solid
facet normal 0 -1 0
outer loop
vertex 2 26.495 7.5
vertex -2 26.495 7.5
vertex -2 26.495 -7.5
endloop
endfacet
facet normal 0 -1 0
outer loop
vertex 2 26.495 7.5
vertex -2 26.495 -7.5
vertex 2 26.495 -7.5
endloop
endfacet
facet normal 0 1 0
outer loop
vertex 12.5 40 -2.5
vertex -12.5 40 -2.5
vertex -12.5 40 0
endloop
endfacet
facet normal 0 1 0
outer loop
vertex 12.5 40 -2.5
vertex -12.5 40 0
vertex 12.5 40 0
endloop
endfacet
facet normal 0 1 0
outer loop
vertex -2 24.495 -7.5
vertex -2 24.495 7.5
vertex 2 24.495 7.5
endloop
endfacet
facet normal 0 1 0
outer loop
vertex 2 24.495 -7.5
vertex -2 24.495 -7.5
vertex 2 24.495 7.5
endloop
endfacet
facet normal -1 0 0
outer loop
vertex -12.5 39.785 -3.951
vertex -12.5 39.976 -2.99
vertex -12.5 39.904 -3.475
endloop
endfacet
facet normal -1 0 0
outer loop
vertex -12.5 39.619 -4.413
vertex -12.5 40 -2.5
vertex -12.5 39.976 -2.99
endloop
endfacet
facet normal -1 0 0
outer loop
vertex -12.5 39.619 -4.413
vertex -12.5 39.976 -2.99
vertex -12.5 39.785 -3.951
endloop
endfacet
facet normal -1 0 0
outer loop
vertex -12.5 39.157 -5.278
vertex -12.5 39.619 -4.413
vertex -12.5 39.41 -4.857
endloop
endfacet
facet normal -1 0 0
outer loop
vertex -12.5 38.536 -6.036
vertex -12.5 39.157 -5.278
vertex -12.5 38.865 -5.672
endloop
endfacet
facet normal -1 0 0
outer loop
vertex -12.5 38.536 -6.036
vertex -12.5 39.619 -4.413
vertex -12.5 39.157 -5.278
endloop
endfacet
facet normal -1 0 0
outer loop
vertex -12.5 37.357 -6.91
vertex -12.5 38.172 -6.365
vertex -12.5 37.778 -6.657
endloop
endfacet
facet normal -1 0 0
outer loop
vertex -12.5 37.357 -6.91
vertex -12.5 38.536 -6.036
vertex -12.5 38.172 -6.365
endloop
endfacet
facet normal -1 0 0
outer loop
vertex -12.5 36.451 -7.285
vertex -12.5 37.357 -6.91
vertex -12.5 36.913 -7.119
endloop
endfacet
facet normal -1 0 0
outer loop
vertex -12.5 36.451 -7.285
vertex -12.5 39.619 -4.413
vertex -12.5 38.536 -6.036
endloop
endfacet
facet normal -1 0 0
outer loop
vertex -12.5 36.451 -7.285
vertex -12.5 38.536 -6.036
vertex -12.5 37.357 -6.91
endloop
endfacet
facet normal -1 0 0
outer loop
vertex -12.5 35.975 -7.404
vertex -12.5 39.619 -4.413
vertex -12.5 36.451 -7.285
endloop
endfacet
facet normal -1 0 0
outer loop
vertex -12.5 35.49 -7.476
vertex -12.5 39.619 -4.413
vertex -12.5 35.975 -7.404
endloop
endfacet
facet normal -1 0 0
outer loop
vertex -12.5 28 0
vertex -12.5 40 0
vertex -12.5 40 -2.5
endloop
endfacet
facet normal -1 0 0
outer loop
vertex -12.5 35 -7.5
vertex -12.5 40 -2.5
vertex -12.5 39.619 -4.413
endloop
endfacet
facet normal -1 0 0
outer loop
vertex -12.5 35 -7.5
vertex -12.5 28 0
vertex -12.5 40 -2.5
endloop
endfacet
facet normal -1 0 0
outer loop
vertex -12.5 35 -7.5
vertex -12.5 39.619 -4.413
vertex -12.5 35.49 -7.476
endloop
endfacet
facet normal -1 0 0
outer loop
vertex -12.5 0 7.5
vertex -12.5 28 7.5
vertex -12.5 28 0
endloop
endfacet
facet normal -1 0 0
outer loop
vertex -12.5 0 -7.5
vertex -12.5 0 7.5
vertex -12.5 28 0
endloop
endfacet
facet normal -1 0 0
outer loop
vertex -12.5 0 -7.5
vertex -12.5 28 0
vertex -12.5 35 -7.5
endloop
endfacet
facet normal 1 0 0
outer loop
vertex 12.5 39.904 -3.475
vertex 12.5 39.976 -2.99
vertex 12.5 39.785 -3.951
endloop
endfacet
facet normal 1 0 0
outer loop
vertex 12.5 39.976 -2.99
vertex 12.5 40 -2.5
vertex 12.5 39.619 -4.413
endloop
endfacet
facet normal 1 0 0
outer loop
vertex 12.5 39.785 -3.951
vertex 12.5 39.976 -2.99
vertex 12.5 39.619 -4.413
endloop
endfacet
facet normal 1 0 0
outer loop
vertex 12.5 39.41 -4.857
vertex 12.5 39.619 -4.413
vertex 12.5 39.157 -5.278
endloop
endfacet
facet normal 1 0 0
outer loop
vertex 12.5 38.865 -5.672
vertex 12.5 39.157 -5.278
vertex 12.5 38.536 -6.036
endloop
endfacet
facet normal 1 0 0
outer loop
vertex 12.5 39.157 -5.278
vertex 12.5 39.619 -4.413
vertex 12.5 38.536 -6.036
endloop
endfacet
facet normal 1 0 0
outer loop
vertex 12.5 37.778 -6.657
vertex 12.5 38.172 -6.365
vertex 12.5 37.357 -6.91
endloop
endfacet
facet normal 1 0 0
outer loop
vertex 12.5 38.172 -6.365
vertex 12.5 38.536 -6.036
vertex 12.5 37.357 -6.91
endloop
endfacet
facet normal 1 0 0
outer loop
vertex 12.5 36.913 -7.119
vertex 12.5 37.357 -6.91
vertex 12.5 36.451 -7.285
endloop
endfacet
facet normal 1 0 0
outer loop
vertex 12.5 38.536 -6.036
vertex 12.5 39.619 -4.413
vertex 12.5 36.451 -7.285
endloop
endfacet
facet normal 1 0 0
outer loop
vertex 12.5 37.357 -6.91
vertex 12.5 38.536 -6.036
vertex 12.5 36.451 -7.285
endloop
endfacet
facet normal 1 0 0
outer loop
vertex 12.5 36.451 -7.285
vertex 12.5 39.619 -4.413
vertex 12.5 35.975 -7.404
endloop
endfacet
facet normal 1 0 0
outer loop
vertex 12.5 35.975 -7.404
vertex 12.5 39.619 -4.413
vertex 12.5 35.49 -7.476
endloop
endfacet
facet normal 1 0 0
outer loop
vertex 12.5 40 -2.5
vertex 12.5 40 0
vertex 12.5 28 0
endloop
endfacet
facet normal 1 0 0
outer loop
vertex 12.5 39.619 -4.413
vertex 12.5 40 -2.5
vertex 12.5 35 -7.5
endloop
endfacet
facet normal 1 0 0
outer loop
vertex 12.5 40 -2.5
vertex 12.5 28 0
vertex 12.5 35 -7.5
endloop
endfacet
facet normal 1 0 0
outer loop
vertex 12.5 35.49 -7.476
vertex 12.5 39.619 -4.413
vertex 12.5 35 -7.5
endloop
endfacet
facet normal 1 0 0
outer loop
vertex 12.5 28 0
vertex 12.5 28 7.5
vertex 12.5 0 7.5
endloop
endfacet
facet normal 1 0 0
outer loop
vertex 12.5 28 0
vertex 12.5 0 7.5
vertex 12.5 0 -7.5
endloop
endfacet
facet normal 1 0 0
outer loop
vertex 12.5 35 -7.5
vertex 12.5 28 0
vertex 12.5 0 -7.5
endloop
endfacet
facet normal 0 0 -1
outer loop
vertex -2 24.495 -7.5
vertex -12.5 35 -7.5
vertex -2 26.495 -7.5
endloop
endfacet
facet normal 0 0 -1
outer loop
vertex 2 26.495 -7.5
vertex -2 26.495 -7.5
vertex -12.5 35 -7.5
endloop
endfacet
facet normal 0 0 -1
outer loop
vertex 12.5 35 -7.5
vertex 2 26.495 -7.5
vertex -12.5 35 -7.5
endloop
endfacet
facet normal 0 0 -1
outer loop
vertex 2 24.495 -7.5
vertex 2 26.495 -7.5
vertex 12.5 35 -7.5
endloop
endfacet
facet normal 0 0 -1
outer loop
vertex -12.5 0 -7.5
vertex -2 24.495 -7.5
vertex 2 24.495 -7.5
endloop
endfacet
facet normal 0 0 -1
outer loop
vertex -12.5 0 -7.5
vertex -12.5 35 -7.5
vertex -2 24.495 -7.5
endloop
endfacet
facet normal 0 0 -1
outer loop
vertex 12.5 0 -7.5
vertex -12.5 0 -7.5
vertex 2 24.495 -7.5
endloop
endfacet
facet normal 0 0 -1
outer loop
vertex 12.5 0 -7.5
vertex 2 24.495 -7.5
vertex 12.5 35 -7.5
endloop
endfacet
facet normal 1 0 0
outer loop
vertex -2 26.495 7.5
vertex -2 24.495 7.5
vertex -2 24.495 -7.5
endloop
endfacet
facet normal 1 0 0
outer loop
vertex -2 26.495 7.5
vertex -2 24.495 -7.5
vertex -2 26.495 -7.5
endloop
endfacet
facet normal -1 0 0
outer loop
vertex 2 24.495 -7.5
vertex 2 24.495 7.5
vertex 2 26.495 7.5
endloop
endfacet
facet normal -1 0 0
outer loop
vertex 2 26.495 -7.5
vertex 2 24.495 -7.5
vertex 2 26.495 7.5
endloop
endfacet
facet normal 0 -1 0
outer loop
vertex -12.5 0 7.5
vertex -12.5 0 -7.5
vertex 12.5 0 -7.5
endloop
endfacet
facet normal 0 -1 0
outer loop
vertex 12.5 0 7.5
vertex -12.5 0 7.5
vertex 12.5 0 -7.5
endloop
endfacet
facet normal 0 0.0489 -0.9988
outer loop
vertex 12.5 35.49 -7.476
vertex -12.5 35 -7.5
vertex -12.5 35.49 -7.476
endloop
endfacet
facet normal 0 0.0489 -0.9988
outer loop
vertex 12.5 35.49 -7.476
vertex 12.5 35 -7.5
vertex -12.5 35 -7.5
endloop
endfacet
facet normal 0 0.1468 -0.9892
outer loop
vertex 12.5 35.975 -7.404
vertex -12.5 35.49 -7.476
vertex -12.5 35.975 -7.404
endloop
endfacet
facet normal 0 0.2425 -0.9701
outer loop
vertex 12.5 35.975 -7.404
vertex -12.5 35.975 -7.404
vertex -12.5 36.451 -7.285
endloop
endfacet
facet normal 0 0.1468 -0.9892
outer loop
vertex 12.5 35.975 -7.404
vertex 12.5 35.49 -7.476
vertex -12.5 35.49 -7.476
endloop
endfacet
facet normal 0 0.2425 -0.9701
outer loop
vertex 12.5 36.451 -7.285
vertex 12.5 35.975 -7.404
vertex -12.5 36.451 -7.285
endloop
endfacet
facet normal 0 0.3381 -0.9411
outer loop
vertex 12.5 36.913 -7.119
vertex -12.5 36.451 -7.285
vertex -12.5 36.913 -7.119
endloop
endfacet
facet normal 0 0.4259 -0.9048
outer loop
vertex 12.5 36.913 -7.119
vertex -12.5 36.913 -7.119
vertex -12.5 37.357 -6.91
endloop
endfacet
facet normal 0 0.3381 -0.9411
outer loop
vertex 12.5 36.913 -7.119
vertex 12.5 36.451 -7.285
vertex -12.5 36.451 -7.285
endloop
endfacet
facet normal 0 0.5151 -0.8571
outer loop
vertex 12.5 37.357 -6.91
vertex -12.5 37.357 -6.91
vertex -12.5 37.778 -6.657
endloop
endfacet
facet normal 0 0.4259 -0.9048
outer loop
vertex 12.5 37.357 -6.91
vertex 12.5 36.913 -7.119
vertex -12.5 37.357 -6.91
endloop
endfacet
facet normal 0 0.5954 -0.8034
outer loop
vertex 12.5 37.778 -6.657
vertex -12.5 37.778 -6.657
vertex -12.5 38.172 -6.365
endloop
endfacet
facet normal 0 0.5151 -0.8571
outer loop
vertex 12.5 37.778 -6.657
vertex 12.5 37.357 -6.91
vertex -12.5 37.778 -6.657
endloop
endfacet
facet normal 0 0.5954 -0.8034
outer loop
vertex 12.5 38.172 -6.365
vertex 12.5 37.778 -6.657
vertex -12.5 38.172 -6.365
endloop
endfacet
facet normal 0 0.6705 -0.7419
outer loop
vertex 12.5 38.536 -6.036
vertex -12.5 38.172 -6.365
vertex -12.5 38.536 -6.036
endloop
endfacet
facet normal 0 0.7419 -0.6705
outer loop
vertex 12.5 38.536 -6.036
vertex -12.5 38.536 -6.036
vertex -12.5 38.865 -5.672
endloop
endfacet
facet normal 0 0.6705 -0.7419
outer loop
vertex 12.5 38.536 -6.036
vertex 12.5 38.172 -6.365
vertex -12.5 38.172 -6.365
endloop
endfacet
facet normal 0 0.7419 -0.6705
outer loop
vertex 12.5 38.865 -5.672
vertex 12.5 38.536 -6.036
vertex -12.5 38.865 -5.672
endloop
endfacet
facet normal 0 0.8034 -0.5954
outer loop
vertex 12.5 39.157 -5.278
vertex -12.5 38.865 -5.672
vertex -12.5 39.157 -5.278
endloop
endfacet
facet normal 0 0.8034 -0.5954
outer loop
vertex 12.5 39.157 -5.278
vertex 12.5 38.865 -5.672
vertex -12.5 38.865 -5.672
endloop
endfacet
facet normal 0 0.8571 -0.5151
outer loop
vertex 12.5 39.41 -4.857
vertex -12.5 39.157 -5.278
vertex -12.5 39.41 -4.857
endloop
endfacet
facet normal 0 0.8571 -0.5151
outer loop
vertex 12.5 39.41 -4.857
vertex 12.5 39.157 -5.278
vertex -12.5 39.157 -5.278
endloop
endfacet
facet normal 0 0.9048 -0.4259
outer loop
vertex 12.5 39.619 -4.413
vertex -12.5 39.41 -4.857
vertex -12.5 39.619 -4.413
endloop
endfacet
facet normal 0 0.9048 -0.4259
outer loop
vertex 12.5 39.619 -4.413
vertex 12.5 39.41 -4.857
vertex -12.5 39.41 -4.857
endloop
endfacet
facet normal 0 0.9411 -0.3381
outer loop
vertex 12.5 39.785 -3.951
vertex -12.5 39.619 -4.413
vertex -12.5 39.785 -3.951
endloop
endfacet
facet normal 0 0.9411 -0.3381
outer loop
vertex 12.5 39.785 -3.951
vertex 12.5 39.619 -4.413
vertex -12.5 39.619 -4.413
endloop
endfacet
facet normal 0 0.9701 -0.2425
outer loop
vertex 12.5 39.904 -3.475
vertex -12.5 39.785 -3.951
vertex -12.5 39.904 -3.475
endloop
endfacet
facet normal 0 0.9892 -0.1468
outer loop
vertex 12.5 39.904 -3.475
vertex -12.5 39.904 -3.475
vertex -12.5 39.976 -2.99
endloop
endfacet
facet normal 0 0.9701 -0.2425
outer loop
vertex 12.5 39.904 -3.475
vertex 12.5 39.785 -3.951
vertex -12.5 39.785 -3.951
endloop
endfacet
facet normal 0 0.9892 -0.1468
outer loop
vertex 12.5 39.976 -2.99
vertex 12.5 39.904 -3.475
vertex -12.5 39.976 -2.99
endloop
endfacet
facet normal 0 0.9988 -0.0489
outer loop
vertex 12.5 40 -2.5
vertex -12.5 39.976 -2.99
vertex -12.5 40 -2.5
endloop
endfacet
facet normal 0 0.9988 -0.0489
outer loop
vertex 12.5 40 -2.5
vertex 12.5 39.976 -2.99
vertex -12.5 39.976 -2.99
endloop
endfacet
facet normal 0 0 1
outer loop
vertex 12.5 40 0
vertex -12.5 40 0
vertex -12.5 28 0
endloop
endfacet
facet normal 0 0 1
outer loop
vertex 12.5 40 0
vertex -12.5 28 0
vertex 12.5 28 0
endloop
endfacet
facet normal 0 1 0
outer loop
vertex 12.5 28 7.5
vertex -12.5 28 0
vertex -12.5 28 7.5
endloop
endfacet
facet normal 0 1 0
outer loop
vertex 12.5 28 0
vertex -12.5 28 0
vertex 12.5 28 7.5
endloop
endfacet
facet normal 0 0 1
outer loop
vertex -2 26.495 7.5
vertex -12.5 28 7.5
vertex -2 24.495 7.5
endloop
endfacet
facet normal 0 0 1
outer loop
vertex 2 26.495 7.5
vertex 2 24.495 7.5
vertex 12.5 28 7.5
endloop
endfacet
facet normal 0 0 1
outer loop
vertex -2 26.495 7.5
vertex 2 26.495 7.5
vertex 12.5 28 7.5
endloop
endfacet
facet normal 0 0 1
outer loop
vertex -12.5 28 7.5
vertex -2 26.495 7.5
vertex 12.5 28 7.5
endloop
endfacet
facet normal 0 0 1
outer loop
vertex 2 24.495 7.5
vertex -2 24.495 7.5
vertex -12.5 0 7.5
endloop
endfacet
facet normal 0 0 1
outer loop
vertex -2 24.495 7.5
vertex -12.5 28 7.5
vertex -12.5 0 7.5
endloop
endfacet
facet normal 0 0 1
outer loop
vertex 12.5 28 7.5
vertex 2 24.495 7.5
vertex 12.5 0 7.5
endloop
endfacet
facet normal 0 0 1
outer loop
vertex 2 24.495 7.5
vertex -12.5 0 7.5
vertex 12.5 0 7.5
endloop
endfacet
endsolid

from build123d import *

# Parameters (mm, degrees)
SKIZZE1_W                       = 25
SKIZZE1_H                       = 15
AUFSATZ_LINEAR_AUSTRAGEN1_DEPTH = 40
SKIZZE2_W                       = 25
SKIZZE2_H                       = 7.5
SCHNITT_LINEAR_AUSTRAGEN1_DEPTH = 12
VERRUNDUNG1_R                   = 5
SKIZZE3_W                       = 4
SKIZZE3_H                       = 2
SCHNITT_LINEAR_AUSTRAGEN2_DEPTH = 45.511234537


with BuildPart() as part:
    # Skizze1 → Aufsatz-Linear austragen1 (new body)
    with BuildSketch(Plane(origin=(0, 0, 0), x_dir=(1, 0, 0), z_dir=(0, 1, 0))):
        Rectangle(SKIZZE1_W, SKIZZE1_H)
    extrude(amount=AUFSATZ_LINEAR_AUSTRAGEN1_DEPTH)

    # Skizze2 → Schnitt-Linear austragen1 (cut)
    with BuildSketch(Plane(origin=(0, 40, 0), x_dir=(1, 0, 0), z_dir=(0, 1, 0))):
        with Locations((0, -3.75)):
            Rectangle(SKIZZE2_W, SKIZZE2_H)
    extrude(amount=-SCHNITT_LINEAR_AUSTRAGEN1_DEPTH, mode=Mode.SUBTRACT)

    # Verrundung1
    verrundung1_edges = [part.edges().sort_by_distance(p)[0] for p in [
        (0, 40, -7.5),
    ]]
    fillet(verrundung1_edges, radius=VERRUNDUNG1_R)

    # Skizze3 → Schnitt-Linear austragen2 (cut, through all)
    with BuildSketch(Plane.XY.offset(7.5)):
        with Locations((0, 25.494720236)):
            Rectangle(SKIZZE3_W, SKIZZE3_H)
    extrude(amount=-SCHNITT_LINEAR_AUSTRAGEN2_DEPTH, mode=Mode.SUBTRACT)


solid = part.part
